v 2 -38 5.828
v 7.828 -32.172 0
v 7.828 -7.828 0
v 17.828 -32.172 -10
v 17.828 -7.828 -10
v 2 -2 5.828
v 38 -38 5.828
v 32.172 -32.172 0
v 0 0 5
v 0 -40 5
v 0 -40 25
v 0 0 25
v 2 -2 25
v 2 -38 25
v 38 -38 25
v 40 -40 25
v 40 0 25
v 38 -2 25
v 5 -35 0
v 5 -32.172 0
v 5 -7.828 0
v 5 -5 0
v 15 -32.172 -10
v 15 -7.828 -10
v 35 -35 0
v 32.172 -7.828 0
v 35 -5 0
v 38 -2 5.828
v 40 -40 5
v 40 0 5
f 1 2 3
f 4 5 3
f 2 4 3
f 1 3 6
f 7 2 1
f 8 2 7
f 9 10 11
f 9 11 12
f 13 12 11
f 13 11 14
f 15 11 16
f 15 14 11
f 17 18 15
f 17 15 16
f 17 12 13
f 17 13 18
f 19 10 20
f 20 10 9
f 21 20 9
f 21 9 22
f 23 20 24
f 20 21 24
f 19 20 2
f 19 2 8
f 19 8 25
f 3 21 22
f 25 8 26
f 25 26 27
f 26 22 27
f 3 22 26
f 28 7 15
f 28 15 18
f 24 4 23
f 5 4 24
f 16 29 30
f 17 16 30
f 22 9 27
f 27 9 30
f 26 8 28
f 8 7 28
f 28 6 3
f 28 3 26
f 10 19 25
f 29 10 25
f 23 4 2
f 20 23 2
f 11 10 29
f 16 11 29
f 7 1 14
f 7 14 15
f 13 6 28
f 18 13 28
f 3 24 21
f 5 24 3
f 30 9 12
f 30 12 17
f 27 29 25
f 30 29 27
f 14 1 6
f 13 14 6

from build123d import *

# Parameters (mm, degrees)
SKETCH1_W           = 40
SKETCH1_H           = 40
BOSS_EXTRUDE1_DEPTH = 25
CHAMFER1_SIZE       = 5
CHAMFER2_SIZE       = 5
CHAMFER3_SIZE       = 5
CHAMFER4_SIZE       = 5
SHELL1_T            = -2
SKETCH7_W           = 10
SKETCH7_H           = 24.34314575
BOSS_EXTRUDE6_DEPTH = 10
CUT_EXTRUDE2_DEPTH  = 24.343146
SKETCH11_W          = 10
SKETCH11_H          = 24.34314575
BOSS_EXTRUDE8_DEPTH = 2.828427
CUT_EXTRUDE4_DEPTH  = 58.096498152


with BuildPart() as part:
    # Sketch1 → Boss-Extrude1 (new body)
    with BuildSketch(Plane.XY):
        with Locations((20, -20)):
            Rectangle(SKETCH1_W, SKETCH1_H)
    extrude(amount=BOSS_EXTRUDE1_DEPTH)

    # Chamfer1
    chamfer1_edges = [part.edges().sort_by_distance(p)[0] for p in [
        (0, -20, 0),
    ]]
    chamfer(chamfer1_edges, length=CHAMFER1_SIZE)

    # Chamfer2
    chamfer2_edges = [part.edges().sort_by_distance(p)[0] for p in [
        (40, -20, 0),
    ]]
    chamfer(chamfer2_edges, length=CHAMFER2_SIZE)

    # Chamfer3
    chamfer3_edges = [part.edges().sort_by_distance(p)[0] for p in [
        (20, -40, 0),
    ]]
    chamfer(chamfer3_edges, length=CHAMFER3_SIZE)

    # Chamfer4
    chamfer4_edges = [part.edges().sort_by_distance(p)[0] for p in [
        (20, 0, 0),
    ]]
    chamfer(chamfer4_edges, length=CHAMFER4_SIZE)

    # Shell1
    shell1_openings = [part.faces().sort_by_distance(p)[0] for p in [
        (20, -20, 25),
        (20, -20, 0),
    ]]
    offset(amount=SHELL1_T, openings=shell1_openings, kind=Kind.INTERSECTION)



with BuildPart() as body_2:
    # Sketch7 → Boss-Extrude6 (new body)
    with BuildSketch(Plane(origin=(0, 0, 0), x_dir=(-1, 0, 0), z_dir=(0, 0, -1))):
        with Locations((-12.828427125, -20)):
            Rectangle(SKETCH7_W, SKETCH7_H)
    extrude(amount=BOSS_EXTRUDE6_DEPTH)

    # Sketch8 → Cut-Extrude2 (cut)
    with BuildSketch(Plane(origin=(0, -7.828427125, 0), x_dir=(1, 0, 0), z_dir=(0, 1, 0))):
        Polygon((7.828427125, 0), (17.828427125, 0), (17.828427125, 10), align=None)
    extrude(amount=-CUT_EXTRUDE2_DEPTH, mode=Mode.SUBTRACT)


with BuildPart() as part_1:
    add(part.part)

    add(body_2.part)  # Boss-Extrude8 merges body 2
    # Sketch11 → Boss-Extrude8 (add)
    with BuildSketch(Plane.ZY.offset(-7.828427125)):
        with Locations((-5, -20)):
            Rectangle(SKETCH11_W, SKETCH11_H)
    extrude(amount=BOSS_EXTRUDE8_DEPTH)

    # Sketch13 → Cut-Extrude4 (cut, through all)
    with BuildSketch(Plane(origin=(0, -7.828427125, 0), x_dir=(1, 0, 0), z_dir=(0, 1, 0))):
        Polygon((5, 0), (15, 10), (5, 10), align=None)
    extrude(amount=-CUT_EXTRUDE4_DEPTH, mode=Mode.SUBTRACT)


solid = part_1.part
